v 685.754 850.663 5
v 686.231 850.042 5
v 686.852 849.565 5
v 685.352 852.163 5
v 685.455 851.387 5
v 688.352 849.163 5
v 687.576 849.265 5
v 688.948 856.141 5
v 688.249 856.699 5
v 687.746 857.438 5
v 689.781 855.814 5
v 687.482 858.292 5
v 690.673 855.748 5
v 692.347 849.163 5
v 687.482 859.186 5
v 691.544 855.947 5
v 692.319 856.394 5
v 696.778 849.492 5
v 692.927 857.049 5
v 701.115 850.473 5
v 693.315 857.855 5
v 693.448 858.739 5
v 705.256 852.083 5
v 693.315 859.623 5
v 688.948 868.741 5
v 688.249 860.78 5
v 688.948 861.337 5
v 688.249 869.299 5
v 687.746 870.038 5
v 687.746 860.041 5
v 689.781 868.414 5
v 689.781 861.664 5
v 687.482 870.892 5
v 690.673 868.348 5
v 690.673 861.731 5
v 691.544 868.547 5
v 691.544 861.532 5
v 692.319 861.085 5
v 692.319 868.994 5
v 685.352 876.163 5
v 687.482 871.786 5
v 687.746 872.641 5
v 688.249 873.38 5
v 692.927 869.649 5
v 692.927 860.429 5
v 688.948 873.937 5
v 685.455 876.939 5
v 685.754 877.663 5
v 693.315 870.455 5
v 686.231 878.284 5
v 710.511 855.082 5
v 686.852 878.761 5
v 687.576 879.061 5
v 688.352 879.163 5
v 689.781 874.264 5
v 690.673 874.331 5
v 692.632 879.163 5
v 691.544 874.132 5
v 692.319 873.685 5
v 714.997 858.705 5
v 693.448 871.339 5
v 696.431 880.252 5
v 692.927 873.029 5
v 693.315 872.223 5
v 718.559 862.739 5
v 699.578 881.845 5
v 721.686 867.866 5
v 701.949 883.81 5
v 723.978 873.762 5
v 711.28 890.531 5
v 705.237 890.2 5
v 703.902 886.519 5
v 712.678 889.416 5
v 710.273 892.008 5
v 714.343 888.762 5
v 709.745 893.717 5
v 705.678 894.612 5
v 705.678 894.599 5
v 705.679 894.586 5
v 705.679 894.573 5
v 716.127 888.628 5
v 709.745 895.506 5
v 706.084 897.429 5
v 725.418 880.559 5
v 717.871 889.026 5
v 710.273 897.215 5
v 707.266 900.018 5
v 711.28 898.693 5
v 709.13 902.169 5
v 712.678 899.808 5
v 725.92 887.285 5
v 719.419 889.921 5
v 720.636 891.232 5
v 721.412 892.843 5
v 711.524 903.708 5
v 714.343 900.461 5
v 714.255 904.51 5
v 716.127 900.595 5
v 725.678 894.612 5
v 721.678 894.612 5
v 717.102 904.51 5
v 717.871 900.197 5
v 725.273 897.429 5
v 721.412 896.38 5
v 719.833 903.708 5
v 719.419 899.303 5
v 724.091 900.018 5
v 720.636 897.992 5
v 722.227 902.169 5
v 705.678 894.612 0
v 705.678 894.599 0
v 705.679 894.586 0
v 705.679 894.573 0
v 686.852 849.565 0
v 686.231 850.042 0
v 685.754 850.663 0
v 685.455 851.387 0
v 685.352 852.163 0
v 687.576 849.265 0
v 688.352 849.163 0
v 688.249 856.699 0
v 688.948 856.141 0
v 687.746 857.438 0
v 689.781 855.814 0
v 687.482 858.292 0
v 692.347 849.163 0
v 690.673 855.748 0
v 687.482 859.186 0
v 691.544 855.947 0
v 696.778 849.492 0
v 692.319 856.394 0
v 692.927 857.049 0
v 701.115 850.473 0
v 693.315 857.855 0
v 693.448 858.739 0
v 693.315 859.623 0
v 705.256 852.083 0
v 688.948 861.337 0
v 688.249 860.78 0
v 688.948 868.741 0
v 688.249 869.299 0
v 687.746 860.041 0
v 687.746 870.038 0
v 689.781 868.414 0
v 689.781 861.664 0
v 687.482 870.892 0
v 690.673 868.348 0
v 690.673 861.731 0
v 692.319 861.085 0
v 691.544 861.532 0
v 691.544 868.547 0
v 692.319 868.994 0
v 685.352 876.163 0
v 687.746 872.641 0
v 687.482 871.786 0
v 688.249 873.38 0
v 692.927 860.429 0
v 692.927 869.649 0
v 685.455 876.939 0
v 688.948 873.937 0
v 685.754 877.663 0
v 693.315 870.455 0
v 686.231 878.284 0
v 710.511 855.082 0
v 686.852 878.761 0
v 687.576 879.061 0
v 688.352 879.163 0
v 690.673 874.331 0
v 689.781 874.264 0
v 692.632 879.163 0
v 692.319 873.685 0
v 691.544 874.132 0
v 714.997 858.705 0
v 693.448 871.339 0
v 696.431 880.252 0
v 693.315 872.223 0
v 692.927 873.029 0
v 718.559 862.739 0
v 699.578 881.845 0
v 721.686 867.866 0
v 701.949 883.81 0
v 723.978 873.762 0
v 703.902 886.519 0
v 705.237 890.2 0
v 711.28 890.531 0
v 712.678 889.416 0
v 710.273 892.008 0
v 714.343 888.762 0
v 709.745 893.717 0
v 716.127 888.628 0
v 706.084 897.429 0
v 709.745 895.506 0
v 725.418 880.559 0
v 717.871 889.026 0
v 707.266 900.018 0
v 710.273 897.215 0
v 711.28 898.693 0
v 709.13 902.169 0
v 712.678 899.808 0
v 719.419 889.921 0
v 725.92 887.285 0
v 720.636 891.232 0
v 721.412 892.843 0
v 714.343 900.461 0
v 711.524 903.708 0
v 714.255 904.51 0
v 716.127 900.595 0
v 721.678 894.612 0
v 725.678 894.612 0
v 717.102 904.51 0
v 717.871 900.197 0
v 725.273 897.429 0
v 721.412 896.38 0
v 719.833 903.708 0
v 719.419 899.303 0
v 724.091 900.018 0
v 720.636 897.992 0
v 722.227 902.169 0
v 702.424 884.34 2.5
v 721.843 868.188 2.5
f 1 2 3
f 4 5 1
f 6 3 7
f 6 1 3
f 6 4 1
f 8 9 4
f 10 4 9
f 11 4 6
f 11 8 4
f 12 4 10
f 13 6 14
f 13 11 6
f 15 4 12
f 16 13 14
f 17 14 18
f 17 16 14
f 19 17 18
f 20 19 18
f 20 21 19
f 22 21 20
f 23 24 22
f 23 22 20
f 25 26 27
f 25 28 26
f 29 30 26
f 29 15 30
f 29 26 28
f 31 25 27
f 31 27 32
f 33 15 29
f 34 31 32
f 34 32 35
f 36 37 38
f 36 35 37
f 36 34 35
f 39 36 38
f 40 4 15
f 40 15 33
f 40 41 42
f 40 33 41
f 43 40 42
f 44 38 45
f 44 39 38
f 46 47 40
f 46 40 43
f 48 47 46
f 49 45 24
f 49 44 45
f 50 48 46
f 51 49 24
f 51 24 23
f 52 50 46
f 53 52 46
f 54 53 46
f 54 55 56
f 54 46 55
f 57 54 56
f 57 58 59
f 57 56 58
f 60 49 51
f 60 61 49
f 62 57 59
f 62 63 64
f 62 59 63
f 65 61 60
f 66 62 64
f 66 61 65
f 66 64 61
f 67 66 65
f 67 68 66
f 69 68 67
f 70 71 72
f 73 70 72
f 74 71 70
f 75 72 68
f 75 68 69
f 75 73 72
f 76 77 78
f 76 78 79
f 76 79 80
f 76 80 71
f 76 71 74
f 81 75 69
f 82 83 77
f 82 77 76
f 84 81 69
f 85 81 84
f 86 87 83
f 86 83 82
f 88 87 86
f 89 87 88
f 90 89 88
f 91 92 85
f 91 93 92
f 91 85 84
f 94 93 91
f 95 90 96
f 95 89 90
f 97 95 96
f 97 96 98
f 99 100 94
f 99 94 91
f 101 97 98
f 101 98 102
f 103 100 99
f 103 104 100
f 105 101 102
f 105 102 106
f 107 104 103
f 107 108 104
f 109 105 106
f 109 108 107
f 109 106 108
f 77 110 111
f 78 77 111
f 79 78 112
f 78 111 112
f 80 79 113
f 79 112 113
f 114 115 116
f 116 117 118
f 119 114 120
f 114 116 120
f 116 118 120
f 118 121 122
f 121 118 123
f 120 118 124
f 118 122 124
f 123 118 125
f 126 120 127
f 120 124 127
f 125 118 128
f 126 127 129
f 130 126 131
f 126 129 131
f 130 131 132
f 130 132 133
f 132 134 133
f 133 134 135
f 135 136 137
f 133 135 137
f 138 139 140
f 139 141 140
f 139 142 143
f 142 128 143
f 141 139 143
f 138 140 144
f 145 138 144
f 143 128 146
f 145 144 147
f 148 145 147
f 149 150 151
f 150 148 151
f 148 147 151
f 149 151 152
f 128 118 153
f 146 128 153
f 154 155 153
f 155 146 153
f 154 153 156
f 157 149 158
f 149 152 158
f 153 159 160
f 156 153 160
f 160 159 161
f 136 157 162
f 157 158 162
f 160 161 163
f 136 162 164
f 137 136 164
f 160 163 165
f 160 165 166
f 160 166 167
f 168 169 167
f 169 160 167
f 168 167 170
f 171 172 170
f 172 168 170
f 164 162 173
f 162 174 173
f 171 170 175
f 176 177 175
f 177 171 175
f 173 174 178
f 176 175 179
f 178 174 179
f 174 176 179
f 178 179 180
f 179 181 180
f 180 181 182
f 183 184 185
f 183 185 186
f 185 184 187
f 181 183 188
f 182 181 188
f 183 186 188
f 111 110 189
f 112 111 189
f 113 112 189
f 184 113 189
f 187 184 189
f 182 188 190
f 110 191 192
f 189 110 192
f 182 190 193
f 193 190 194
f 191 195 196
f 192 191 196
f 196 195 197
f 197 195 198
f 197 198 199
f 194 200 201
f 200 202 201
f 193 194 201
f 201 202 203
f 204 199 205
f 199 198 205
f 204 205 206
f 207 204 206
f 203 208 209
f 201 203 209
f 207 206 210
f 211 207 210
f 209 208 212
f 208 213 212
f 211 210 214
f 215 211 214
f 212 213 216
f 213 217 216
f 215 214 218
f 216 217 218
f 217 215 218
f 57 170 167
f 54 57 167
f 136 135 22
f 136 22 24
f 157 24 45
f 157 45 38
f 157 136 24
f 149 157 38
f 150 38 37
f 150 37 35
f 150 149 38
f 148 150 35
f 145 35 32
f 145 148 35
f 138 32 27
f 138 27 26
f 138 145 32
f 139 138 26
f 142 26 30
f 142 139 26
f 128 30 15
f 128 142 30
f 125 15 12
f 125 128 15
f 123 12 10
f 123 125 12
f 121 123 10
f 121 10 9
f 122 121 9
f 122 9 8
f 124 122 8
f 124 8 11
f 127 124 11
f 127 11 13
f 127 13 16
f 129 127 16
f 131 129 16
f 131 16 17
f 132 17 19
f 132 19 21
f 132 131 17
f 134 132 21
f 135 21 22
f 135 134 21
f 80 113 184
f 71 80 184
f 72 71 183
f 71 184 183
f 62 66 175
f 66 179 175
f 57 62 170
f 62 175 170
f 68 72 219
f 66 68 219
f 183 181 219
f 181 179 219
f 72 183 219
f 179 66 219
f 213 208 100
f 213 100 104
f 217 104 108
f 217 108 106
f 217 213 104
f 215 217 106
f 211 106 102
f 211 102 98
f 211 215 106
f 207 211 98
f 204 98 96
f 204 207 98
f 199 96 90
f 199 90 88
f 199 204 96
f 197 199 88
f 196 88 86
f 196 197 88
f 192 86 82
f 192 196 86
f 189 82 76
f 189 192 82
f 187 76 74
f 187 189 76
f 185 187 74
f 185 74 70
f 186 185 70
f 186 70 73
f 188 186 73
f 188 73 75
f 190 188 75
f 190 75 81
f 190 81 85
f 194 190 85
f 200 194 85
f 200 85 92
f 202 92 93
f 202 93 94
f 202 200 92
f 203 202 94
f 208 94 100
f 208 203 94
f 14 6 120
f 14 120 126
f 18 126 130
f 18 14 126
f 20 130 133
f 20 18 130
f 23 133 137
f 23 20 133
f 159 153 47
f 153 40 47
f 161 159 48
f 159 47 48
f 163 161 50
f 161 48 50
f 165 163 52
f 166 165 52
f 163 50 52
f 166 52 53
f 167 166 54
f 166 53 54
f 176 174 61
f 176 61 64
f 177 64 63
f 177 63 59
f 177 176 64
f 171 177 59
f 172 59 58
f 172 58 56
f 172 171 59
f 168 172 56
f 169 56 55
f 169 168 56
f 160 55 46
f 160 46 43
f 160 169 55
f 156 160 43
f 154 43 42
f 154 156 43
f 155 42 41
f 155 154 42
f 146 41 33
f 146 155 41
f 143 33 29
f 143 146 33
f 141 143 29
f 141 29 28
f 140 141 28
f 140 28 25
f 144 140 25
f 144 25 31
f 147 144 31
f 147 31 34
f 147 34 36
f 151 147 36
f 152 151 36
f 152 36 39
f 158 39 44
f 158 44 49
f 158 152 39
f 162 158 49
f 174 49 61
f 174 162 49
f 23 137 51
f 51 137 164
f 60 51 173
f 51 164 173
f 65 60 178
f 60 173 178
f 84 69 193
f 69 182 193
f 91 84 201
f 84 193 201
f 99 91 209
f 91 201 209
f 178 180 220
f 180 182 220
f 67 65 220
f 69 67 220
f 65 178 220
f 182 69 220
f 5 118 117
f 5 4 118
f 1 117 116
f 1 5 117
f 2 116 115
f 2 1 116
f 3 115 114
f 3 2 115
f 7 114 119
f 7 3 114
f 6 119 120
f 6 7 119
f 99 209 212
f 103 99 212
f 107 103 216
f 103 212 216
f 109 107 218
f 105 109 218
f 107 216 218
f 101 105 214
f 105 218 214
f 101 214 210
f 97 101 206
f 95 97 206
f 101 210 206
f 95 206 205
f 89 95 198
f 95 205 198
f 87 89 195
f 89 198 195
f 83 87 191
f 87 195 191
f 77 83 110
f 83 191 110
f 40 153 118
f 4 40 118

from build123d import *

# Parameters (mm, degrees)
SKETCH1_R           = 3
SKETCH1_R_2         = 6
BOSS_EXTRUDE1_DEPTH = 5
FILLET1_R           = 30
FILLET3_R           = 3
FILLET4_R           = 3


with BuildPart() as part:
    # Sketch1 → Boss-Extrude1 (new body)
    with BuildSketch(Plane.XY):
        with BuildLine():
            Line((685.352484273, 879.16298506), (685.352484273, 849.16298506))
            Line((685.352484273, 849.16298506), (697.448463409, 849.16298506))
            add(Edge.make_bspline(
                [(697.448463409, 849.16298506), (728.616221011, 858.08895863), (725.678478781, 894.611707807)],
                knots=[0, 0, 0, 1, 1, 1], degree=2))
            ThreePointArc((725.678478781, 894.611707807), (715.678478781, 904.611707807), (705.678478781, 894.611707807))
            ThreePointArc((705.678478781, 894.611707807), (705.67849738, 894.592421342), (705.678553175, 894.573134948))
            add(Edge.make_bspline(
                [(705.678553175, 894.573134948), (705.693307068, 881.810970257), (692.631868047, 879.16298506)],
                knots=[0.001508038, 0.001508038, 0.001508038, 1, 1, 1], degree=2))
            Line((692.631868047, 879.16298506), (685.352484273, 879.16298506))
        make_face()
        with Locations((690.448463409, 858.739216263)):
            Circle(SKETCH1_R, mode=Mode.SUBTRACT)
        with Locations((690.448463409, 871.339216263)):
            Circle(SKETCH1_R, mode=Mode.SUBTRACT)
        with Locations((715.678478781, 894.611707807)):
            Circle(SKETCH1_R_2, mode=Mode.SUBTRACT)
    extrude(amount=BOSS_EXTRUDE1_DEPTH)

    # Fillet1
    fillet1_edges = [part.edges().sort_by_distance(p)[0] for p in [
        (697.448463409, 849.16298506, 2.5),
    ]]
    fillet(fillet1_edges, radius=FILLET1_R)

    # Fillet3
    fillet3_edges = [part.edges().sort_by_distance(p)[0] for p in [
        (685.352484273, 879.16298506, 2.5),
    ]]
    fillet(fillet3_edges, radius=FILLET3_R)

    # Fillet4
    fillet4_edges = [part.edges().sort_by_distance(p)[0] for p in [
        (685.352484273, 849.16298506, 2.5),
    ]]
    fillet(fillet4_edges, radius=FILLET4_R)


solid = part.part
